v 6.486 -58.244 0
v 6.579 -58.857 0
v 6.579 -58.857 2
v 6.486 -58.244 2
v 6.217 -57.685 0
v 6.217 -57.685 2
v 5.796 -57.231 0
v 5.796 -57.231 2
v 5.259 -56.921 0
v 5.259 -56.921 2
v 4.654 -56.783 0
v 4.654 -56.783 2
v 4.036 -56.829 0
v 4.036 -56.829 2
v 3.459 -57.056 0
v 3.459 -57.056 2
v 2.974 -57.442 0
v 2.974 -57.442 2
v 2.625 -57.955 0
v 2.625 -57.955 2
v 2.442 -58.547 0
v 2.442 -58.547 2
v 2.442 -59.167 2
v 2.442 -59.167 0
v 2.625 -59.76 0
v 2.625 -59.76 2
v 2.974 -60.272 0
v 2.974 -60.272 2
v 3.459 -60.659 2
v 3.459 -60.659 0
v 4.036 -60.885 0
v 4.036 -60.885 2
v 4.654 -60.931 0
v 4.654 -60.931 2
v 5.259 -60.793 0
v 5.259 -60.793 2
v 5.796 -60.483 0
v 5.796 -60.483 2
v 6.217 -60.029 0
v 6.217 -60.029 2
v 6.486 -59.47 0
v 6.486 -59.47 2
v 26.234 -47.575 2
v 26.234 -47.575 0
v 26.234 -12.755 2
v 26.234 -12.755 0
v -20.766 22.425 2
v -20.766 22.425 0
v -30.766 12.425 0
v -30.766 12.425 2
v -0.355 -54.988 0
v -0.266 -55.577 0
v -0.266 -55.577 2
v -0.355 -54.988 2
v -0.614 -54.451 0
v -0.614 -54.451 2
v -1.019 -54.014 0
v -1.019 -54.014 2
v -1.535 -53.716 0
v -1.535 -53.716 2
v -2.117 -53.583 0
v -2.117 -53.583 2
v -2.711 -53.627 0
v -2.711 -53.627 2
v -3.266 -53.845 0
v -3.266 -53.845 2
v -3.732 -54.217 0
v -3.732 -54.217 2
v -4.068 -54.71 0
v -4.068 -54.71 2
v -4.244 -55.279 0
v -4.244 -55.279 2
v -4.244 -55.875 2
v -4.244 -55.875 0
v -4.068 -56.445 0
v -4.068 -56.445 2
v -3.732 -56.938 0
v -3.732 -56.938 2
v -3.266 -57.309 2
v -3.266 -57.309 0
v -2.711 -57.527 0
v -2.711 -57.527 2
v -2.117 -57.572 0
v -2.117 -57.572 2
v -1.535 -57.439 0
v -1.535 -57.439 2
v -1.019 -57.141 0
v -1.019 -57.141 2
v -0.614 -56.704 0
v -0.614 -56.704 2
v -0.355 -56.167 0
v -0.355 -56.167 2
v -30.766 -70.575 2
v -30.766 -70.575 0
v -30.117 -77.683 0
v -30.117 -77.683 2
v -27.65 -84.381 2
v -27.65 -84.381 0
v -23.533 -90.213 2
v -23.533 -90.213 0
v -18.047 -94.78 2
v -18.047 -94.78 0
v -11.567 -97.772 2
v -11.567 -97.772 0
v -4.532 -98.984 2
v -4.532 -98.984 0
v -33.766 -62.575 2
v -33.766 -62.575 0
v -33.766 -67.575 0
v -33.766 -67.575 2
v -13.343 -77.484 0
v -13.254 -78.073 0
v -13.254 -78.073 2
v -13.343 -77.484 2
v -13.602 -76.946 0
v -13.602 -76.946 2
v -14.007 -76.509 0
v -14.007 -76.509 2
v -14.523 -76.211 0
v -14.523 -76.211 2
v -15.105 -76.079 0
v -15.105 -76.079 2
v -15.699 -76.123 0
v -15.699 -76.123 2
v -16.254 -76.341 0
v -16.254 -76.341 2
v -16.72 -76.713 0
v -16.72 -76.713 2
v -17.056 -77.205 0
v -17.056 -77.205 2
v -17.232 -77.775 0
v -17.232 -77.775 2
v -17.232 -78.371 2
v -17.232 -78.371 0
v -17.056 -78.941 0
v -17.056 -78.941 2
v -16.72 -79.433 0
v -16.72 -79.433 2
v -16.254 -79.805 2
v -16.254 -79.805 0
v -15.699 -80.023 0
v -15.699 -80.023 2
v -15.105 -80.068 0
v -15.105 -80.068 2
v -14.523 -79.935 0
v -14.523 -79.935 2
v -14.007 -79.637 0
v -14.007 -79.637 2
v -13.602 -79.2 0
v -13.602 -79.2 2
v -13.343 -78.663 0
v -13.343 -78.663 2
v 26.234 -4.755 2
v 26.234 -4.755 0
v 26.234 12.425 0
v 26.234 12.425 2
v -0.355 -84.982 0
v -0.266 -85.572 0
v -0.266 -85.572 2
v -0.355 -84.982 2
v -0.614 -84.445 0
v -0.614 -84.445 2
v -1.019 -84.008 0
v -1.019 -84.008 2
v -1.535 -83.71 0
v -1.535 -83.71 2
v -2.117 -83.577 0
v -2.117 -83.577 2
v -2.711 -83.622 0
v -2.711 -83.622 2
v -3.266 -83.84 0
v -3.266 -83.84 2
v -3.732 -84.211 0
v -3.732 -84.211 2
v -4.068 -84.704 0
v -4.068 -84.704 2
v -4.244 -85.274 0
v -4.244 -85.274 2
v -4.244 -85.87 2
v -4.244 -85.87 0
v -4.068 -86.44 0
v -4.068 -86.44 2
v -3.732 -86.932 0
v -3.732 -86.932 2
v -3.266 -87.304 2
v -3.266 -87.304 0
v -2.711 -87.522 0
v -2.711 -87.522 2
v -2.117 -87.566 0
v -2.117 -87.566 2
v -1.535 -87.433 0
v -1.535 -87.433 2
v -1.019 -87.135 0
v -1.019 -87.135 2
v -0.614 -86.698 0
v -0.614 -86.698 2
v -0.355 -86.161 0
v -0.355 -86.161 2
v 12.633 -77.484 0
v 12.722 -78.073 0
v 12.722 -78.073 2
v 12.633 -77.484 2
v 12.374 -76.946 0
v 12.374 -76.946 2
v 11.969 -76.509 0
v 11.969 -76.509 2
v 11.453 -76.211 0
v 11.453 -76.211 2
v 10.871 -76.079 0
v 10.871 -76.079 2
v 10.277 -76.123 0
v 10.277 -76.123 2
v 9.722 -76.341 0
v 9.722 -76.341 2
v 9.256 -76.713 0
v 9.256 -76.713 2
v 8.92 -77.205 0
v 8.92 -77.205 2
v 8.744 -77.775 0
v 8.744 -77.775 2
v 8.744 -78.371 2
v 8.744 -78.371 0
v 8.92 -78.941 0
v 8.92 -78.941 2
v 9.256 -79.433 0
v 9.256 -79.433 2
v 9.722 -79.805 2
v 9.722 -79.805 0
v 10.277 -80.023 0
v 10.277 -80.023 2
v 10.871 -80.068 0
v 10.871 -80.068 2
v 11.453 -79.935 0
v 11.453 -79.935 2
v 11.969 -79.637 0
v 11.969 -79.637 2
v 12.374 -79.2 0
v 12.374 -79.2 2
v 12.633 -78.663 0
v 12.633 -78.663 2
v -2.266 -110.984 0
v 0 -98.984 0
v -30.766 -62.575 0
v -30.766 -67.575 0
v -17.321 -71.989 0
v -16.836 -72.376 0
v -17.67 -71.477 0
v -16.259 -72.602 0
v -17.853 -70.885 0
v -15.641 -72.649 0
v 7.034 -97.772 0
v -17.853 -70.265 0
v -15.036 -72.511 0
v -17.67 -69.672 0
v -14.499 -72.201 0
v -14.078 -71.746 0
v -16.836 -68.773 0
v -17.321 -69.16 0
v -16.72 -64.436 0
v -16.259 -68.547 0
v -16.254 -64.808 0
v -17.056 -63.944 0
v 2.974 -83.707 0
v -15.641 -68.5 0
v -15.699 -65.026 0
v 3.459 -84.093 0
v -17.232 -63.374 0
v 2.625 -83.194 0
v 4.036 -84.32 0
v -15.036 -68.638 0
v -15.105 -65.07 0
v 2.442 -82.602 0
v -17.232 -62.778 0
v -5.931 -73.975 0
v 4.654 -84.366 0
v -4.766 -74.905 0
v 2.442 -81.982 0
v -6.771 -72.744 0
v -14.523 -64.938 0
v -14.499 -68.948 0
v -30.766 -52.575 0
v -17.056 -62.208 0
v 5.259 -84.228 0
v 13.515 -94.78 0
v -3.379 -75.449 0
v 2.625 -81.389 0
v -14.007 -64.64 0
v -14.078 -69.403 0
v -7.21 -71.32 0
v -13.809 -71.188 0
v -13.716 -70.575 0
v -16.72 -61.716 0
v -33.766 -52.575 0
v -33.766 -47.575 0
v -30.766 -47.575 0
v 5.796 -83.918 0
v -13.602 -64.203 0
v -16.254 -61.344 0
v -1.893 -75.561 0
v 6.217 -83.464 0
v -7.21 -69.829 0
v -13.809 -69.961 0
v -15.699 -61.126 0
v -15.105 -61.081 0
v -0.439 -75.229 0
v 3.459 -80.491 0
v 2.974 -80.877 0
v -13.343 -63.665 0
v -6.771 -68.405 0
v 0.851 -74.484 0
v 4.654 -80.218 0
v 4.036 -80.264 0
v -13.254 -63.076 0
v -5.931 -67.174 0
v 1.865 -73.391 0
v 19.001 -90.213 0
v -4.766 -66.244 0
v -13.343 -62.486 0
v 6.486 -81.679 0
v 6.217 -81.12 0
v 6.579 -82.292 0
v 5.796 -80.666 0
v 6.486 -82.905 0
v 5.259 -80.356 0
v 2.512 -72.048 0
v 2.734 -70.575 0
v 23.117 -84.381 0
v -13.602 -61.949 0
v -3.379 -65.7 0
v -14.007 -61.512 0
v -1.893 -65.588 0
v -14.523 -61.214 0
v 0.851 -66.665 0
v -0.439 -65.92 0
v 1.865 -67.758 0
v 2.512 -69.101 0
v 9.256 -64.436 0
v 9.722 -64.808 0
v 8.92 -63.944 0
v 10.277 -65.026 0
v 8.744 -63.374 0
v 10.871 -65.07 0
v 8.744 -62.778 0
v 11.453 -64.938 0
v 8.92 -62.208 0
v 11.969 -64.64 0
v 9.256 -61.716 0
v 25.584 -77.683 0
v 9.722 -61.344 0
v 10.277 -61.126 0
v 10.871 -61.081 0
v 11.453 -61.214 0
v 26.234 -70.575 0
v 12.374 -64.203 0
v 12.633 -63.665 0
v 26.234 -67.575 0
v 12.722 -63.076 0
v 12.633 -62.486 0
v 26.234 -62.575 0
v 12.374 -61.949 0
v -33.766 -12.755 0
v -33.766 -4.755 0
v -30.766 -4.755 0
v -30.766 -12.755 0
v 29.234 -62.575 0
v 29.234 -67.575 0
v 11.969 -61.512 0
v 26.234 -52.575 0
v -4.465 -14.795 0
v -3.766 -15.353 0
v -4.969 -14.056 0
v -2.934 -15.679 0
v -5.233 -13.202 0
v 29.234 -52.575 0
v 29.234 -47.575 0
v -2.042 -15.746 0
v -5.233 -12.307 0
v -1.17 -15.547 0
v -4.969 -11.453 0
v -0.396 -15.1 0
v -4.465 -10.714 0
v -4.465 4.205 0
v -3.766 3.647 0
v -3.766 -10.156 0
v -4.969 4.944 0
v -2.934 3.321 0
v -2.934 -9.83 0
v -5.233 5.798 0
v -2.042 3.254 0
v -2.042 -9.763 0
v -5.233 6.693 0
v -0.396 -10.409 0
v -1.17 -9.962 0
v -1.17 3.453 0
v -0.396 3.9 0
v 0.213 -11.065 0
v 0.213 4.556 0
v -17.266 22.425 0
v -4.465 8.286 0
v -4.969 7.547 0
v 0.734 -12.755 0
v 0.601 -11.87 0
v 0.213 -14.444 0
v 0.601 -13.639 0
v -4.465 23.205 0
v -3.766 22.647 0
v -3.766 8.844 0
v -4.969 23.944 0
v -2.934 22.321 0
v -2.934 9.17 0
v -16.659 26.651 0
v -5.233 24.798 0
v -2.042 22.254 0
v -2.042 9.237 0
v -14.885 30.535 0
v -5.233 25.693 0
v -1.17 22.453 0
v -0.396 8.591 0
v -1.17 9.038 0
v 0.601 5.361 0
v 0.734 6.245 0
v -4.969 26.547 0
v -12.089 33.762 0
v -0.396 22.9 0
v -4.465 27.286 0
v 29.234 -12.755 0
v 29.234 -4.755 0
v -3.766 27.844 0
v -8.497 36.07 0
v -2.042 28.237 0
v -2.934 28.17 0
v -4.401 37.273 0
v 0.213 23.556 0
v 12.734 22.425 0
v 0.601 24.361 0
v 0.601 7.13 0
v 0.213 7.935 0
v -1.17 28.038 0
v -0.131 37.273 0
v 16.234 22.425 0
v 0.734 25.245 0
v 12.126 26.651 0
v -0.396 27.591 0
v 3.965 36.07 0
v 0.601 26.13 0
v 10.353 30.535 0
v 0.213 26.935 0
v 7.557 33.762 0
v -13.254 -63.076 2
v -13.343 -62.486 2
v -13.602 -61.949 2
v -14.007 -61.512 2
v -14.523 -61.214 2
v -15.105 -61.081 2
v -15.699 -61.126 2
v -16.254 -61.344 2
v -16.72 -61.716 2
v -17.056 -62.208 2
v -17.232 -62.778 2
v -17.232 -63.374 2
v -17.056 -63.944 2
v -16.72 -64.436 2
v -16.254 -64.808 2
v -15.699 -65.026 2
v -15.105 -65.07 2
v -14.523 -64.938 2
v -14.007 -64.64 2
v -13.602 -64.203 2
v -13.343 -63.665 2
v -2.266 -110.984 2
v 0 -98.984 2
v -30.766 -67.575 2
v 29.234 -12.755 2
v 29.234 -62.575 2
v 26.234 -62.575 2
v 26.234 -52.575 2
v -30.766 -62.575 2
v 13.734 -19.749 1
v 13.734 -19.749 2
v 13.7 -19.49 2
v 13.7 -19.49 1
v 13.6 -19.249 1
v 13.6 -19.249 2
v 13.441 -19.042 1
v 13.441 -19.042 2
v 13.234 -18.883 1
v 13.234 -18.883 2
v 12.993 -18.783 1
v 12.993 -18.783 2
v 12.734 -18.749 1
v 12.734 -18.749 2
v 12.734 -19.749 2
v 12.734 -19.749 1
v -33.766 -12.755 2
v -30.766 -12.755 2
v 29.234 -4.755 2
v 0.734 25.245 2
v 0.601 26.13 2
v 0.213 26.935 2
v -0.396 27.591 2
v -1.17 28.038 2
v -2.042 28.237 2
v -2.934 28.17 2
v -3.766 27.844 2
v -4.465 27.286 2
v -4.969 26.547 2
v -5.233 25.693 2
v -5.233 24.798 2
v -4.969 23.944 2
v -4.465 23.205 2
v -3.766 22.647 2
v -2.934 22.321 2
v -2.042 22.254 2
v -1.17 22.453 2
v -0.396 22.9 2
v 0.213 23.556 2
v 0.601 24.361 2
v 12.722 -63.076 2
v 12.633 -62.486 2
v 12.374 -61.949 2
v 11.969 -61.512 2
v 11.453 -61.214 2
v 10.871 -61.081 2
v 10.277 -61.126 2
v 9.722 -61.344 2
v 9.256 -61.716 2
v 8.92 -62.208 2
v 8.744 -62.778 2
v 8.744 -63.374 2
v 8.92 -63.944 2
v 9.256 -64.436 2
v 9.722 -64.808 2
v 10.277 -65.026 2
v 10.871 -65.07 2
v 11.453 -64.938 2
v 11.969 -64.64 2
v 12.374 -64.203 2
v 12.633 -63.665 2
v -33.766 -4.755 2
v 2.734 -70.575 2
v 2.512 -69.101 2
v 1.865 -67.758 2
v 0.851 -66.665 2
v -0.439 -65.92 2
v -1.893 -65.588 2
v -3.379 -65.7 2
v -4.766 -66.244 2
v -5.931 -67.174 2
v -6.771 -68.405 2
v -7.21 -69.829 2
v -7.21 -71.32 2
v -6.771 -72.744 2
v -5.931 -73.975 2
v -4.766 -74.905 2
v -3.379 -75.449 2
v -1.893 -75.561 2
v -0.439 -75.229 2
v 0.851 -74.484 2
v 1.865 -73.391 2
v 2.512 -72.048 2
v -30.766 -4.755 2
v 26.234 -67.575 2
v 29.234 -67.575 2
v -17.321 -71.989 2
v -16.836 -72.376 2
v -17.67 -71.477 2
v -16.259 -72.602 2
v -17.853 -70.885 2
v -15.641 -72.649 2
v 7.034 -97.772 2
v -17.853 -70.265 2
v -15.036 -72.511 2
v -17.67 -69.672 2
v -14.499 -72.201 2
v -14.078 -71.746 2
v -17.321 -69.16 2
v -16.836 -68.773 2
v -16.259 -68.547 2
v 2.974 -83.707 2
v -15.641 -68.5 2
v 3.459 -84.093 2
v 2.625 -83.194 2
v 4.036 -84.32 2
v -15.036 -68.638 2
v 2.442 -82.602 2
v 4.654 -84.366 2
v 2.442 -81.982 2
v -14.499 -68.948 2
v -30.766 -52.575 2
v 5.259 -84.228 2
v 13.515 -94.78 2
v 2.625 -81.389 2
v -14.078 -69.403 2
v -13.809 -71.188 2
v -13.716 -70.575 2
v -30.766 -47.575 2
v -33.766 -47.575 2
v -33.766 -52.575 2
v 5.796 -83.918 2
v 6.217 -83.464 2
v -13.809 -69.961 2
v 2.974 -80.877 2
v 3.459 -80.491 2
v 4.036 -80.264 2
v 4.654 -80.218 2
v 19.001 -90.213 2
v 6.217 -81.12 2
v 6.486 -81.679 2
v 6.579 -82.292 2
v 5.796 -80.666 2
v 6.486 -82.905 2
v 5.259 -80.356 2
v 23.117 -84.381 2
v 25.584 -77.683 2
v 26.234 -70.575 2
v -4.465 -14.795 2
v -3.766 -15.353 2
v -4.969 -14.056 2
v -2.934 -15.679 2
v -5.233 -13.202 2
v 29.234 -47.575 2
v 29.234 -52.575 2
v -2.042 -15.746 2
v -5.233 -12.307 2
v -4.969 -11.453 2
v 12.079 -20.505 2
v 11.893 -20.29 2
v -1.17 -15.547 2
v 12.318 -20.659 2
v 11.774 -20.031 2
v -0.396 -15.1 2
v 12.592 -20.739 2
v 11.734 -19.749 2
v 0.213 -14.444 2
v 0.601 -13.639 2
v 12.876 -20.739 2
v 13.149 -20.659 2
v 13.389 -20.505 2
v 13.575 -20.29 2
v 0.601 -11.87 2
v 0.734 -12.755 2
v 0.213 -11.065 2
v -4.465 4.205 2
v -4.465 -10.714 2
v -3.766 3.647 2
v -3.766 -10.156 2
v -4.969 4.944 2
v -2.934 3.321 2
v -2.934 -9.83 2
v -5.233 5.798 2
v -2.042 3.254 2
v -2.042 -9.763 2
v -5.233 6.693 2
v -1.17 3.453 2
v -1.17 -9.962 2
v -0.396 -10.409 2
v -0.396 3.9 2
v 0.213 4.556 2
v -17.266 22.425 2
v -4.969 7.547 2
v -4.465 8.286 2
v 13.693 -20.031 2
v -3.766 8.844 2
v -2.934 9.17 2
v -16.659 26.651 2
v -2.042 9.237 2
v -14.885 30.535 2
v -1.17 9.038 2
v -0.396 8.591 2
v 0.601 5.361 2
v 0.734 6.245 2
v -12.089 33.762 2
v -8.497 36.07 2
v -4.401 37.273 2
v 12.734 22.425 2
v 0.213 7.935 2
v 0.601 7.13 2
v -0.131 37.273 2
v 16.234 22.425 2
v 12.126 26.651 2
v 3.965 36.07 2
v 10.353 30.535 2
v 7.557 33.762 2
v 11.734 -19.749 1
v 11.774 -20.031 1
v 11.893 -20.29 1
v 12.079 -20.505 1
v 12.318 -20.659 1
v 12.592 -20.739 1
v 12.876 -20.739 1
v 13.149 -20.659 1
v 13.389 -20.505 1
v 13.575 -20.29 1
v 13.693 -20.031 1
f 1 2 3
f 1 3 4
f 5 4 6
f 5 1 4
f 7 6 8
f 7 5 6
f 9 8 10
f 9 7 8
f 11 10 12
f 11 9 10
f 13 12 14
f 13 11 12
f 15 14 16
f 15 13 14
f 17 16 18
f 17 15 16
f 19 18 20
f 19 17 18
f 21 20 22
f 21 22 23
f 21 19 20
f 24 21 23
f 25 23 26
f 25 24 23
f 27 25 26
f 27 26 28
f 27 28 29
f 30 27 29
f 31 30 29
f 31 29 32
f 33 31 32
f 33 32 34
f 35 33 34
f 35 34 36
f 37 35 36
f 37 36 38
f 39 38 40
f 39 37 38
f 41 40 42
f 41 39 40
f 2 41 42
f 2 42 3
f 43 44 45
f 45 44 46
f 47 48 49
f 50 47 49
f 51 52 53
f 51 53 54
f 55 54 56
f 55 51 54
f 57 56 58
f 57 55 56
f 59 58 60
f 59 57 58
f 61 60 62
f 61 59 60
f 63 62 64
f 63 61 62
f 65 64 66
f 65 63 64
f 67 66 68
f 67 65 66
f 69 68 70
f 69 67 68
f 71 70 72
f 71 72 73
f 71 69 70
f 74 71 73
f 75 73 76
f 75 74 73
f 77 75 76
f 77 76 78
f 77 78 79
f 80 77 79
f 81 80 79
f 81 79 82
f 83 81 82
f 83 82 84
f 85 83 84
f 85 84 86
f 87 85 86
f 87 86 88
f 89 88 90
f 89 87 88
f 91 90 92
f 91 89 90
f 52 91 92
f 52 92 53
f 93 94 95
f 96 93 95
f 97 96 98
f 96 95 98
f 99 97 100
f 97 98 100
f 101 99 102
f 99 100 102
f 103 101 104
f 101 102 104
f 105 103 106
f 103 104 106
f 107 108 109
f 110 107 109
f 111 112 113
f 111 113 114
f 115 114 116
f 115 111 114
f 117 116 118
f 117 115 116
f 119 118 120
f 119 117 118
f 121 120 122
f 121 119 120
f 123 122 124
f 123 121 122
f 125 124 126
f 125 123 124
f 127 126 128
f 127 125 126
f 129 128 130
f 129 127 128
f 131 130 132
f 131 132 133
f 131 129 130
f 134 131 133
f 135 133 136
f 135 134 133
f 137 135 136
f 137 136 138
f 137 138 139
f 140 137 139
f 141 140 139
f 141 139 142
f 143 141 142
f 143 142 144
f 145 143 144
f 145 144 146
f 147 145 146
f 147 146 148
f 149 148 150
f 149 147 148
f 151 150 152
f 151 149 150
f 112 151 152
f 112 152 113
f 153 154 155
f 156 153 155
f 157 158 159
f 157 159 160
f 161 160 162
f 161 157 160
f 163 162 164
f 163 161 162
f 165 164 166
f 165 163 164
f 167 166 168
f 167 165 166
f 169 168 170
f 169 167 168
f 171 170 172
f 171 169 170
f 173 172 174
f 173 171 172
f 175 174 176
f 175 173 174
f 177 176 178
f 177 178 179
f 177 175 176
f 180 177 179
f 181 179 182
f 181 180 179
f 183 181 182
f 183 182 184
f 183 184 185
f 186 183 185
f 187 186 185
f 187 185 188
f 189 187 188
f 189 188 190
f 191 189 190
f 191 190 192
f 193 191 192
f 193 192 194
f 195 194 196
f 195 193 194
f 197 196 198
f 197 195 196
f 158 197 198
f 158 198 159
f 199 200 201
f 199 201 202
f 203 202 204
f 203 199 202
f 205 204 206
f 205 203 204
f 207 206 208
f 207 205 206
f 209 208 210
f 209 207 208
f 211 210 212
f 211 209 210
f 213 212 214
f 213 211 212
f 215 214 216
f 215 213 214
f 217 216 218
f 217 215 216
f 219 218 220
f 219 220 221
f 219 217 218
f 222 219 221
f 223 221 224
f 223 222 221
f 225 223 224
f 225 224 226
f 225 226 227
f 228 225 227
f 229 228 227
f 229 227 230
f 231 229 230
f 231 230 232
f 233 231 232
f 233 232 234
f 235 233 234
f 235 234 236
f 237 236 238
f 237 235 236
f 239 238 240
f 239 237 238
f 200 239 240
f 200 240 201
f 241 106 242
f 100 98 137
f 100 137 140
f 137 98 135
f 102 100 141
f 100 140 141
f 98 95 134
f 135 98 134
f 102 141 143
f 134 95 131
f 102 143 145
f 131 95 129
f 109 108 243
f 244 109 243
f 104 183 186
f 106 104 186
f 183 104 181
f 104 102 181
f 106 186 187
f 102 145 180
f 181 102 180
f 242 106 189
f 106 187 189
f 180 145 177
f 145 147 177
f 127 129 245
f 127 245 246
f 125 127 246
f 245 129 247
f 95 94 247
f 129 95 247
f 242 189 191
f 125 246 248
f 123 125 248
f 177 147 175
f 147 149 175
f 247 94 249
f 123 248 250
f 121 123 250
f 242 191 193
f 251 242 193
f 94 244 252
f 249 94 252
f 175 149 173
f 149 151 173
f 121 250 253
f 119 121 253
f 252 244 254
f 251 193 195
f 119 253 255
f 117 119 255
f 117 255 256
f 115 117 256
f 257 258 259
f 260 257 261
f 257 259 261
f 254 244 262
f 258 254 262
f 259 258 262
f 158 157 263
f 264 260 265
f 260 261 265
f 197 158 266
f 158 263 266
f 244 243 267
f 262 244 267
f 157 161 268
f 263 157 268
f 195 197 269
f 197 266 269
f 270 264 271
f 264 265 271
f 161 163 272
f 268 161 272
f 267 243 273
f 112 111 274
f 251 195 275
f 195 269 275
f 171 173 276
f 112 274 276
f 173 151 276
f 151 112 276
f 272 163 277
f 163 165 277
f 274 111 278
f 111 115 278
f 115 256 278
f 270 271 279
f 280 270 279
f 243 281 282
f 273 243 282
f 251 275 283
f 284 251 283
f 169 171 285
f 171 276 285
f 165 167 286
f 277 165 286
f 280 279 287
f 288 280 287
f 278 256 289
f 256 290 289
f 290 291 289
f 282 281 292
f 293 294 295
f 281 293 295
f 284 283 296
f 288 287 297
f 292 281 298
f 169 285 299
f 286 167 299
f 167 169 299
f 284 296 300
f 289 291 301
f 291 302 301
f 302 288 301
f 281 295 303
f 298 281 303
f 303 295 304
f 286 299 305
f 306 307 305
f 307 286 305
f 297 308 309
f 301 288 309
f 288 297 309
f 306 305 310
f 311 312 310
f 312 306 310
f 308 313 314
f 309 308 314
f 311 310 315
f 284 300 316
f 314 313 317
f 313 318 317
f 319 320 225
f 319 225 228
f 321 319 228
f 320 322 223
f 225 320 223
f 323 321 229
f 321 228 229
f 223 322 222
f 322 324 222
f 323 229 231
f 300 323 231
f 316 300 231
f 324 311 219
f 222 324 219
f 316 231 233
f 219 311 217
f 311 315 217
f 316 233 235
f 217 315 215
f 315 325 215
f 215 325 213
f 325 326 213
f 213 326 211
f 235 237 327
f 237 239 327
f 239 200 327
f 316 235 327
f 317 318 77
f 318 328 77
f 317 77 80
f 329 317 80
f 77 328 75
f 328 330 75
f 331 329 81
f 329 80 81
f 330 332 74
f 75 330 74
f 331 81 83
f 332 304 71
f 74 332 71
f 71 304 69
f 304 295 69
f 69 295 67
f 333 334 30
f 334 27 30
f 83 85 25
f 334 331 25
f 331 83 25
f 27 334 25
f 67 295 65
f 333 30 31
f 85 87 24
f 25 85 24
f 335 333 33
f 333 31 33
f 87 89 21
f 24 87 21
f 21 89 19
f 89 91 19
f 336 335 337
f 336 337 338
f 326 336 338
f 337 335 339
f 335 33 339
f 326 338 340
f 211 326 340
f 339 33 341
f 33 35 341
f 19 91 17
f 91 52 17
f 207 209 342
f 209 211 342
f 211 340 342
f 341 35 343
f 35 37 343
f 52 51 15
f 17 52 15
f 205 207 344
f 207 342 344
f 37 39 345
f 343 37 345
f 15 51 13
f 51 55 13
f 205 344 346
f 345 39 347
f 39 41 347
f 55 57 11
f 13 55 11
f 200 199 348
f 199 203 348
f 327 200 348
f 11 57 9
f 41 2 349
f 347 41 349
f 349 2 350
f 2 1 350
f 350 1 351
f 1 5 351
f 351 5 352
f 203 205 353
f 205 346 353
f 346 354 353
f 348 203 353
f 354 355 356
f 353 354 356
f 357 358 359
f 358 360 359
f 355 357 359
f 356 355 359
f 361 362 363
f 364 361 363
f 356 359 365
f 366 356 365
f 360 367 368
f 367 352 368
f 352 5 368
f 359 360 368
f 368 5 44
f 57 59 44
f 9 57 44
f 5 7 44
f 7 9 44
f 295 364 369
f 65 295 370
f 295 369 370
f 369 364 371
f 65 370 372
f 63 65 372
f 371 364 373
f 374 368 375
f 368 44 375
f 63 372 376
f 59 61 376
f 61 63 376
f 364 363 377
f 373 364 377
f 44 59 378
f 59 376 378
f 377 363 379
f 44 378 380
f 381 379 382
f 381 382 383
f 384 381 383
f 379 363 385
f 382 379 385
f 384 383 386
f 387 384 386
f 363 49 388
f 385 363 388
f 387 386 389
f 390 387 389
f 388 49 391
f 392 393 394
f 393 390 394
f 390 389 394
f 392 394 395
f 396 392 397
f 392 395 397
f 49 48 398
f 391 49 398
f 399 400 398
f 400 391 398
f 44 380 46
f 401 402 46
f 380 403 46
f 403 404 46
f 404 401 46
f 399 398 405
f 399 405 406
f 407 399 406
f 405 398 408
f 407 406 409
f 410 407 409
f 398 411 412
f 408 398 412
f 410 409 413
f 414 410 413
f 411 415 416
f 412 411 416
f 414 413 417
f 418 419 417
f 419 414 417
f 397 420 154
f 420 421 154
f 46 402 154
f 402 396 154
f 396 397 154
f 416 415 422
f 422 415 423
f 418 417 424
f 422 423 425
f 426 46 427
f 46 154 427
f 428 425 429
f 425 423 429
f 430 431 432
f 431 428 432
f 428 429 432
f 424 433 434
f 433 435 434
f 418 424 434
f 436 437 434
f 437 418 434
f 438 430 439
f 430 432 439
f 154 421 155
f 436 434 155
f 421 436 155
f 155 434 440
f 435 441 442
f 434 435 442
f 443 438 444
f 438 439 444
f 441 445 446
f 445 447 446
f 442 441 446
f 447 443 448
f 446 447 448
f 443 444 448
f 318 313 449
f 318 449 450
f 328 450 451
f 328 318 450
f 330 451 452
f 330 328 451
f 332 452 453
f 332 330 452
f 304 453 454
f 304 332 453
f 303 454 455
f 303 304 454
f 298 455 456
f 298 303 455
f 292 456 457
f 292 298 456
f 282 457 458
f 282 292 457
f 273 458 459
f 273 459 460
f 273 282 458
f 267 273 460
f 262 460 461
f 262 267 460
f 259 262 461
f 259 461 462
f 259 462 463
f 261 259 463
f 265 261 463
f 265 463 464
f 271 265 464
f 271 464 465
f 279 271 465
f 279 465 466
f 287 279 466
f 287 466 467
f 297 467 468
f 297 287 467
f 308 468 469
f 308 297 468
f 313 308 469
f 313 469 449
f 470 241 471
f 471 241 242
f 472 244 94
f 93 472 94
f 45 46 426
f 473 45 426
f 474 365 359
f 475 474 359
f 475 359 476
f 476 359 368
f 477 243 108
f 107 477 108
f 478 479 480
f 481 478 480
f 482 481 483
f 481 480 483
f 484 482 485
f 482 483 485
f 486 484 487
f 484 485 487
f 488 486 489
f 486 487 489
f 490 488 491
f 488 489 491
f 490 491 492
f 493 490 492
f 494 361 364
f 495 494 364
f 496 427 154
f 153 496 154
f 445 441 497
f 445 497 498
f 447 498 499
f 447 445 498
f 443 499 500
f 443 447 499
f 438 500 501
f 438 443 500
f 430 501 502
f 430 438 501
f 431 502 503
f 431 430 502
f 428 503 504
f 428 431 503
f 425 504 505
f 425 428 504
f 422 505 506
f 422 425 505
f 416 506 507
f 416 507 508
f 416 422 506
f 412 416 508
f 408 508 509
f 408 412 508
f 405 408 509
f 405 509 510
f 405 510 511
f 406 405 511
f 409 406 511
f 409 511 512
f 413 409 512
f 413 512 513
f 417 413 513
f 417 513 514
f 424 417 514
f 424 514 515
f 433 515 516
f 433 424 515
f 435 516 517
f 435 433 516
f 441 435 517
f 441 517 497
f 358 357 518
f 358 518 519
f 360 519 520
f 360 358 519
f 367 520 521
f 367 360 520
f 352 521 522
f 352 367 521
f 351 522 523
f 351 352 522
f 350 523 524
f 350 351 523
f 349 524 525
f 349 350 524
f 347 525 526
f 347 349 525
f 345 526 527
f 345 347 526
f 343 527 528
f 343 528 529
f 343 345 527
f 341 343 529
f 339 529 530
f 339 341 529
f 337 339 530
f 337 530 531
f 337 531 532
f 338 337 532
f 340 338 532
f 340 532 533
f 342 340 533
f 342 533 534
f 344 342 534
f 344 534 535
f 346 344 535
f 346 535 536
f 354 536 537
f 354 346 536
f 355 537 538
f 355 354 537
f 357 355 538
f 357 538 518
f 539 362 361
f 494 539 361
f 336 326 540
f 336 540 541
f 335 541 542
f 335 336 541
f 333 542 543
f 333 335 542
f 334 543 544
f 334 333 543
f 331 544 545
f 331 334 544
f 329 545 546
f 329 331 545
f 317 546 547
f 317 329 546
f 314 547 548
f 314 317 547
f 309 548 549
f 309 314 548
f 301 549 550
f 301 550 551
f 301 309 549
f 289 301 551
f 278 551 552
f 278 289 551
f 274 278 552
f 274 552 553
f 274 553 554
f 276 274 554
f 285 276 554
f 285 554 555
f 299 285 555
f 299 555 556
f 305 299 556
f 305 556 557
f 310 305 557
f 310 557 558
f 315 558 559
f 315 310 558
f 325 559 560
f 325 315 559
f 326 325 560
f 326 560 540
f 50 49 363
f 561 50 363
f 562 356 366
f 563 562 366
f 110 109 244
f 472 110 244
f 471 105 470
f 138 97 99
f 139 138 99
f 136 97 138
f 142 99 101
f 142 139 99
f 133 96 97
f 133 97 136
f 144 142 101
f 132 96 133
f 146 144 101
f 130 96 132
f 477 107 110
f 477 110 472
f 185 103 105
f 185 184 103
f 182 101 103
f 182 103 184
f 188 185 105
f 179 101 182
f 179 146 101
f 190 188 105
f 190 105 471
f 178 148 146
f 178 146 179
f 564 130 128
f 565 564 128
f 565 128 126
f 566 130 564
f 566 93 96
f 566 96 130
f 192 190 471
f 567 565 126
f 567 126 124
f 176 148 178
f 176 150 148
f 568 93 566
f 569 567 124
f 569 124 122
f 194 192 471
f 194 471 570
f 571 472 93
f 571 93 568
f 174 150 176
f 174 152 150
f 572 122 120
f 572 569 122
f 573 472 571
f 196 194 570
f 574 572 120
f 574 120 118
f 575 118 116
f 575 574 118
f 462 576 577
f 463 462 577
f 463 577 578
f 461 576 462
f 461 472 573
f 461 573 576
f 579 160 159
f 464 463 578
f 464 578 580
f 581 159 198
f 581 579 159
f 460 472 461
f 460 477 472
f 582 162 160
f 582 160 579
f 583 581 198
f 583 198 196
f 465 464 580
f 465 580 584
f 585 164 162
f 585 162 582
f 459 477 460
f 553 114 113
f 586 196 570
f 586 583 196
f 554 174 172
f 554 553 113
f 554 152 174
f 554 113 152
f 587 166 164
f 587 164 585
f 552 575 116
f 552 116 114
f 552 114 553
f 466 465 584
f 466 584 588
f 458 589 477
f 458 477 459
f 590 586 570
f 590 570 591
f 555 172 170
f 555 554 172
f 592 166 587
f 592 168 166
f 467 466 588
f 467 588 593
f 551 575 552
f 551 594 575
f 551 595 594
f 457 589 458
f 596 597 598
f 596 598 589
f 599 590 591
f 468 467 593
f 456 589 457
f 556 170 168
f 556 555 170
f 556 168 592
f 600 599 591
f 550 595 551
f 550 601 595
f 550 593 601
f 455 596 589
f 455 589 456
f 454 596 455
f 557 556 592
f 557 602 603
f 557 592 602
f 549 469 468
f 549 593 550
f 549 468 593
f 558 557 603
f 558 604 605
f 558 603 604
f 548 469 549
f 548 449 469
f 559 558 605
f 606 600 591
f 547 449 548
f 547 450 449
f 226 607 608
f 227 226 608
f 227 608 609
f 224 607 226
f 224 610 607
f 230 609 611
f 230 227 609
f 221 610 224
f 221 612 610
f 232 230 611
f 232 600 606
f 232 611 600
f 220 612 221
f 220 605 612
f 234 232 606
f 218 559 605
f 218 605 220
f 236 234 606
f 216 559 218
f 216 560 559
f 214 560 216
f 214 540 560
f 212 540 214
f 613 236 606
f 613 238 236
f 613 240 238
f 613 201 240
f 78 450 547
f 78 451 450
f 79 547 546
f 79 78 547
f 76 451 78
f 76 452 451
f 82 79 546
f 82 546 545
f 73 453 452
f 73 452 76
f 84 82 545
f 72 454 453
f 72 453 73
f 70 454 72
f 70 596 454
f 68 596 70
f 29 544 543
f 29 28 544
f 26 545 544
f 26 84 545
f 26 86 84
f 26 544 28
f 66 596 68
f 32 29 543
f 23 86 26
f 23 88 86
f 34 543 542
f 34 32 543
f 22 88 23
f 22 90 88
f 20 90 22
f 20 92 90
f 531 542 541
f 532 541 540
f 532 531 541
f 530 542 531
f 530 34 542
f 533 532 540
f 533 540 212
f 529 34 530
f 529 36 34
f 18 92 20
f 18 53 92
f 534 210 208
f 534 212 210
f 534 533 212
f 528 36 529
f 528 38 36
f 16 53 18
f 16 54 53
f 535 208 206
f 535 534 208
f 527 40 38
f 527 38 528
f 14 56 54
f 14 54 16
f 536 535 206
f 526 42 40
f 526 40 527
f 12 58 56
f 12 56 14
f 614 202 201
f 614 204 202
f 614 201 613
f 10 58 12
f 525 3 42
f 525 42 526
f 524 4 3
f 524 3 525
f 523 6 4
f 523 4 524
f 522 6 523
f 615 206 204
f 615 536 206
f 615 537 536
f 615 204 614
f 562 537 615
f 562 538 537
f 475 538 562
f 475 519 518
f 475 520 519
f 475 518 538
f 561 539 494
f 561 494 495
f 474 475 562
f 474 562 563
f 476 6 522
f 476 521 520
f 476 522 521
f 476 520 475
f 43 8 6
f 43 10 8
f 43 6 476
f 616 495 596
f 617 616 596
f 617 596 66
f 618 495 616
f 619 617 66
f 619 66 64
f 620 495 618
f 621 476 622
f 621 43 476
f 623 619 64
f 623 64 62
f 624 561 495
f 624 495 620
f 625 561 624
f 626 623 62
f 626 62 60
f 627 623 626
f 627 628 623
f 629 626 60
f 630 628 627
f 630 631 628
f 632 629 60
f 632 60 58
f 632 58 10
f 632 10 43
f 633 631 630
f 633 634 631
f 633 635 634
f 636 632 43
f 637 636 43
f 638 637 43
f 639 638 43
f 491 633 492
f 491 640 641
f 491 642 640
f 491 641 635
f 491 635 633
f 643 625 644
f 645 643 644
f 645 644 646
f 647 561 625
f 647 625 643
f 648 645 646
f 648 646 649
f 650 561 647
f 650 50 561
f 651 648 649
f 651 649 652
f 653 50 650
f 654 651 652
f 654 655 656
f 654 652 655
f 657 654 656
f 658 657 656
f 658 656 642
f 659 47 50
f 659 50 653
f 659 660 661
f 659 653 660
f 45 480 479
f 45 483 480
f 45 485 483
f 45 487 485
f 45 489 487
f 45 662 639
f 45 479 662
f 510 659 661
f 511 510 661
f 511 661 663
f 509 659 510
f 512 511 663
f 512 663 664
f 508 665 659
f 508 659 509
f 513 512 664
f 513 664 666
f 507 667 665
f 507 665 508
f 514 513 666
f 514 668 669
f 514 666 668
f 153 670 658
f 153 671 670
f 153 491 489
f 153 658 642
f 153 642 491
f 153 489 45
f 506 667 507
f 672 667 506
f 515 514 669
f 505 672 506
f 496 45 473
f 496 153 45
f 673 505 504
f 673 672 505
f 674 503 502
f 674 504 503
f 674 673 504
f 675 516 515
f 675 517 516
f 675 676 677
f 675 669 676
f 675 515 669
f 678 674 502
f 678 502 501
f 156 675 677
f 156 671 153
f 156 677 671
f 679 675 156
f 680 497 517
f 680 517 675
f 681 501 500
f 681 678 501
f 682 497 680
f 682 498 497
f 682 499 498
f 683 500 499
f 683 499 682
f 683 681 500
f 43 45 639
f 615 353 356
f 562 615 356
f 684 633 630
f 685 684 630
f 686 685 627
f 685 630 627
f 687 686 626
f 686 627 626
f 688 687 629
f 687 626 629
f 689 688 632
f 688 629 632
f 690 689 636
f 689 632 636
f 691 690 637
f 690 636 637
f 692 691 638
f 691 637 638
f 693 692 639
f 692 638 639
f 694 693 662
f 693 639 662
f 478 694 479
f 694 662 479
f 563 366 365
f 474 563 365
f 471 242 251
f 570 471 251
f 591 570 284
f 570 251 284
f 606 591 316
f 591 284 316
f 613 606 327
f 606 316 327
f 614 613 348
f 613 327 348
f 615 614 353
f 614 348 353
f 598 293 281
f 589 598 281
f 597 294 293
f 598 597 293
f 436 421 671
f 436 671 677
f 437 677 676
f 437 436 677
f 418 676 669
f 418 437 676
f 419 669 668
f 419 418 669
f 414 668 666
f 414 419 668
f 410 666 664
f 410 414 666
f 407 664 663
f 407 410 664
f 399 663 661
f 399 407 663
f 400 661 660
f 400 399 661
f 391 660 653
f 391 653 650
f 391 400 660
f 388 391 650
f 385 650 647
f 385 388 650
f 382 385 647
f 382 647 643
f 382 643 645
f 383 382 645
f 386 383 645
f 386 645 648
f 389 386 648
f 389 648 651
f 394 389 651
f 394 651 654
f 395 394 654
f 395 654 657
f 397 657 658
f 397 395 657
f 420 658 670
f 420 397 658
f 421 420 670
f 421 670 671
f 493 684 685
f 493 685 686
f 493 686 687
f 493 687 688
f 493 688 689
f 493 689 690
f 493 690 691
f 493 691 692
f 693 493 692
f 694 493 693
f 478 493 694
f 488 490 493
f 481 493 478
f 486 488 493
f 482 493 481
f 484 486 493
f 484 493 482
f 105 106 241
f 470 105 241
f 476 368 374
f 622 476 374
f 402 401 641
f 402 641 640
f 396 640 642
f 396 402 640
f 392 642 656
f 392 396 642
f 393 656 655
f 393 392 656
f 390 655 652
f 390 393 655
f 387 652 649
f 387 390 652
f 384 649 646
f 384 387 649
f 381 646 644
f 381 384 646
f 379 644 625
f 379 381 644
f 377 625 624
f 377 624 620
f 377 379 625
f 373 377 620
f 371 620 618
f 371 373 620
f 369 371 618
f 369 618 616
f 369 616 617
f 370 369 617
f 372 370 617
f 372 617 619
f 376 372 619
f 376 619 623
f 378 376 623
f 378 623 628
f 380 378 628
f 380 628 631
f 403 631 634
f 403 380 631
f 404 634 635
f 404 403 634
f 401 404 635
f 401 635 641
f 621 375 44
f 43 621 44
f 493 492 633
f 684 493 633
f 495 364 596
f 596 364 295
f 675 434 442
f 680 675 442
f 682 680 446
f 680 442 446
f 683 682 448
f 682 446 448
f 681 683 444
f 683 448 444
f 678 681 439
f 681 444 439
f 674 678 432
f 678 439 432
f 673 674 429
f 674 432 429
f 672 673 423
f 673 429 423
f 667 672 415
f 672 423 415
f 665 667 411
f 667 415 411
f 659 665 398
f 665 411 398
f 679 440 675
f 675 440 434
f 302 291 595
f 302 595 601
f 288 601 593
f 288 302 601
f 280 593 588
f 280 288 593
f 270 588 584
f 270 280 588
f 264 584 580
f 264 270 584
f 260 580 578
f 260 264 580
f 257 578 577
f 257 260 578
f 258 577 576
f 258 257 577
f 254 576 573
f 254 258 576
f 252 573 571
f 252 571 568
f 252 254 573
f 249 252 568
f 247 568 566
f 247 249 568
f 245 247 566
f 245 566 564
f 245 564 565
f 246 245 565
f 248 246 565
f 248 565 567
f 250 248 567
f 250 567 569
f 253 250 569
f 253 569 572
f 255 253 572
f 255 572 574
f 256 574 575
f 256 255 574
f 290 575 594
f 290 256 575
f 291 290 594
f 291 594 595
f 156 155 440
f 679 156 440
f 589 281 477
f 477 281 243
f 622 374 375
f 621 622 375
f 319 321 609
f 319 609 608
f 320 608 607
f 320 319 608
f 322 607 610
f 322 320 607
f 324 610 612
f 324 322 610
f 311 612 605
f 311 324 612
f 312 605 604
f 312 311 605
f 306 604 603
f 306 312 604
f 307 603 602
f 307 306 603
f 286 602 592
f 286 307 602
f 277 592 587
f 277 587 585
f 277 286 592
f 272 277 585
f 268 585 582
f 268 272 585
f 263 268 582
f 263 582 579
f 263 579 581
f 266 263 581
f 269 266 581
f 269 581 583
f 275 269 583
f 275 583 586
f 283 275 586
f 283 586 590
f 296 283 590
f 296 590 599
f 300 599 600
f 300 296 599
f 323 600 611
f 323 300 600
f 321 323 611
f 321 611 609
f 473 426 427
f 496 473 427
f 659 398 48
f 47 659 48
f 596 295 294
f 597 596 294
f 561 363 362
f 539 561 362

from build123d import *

# Parameters (mm, degrees)
SKETCH_1_R          = 2
SKETCH_1_R_2        = 2.08
SKETCH_1_R_3        = 5
SKETCH_1_R_4        = 3
EXTRUDE_1_DEPTH     = 2
CUT_EXTRUDE_1_DEPTH = 1


with BuildPart() as part:
    # 草图1 → 凸台-拉伸1 (new body)
    with BuildSketch(Plane.XY):
        with BuildLine():
            Line((26.233844386, -52.574512395), (29.233844386, -52.574512395))
            Line((29.233844386, -52.574512395), (29.233844386, -47.574512395))
            Line((29.233844386, -47.574512395), (26.233844386, -47.574512395))
            Line((26.233844386, -47.574512395), (26.233844386, -12.754512395))
            Line((26.233844386, -12.754512395), (29.233844386, -12.754512395))
            Line((29.233844386, -12.754512395), (29.233844386, -4.754512395))
            Line((29.233844386, -4.754512395), (26.233844386, -4.754512395))
            Line((26.233844386, -4.754512395), (26.233844386, -4.654512395))
            Line((26.233844386, -4.654512395), (26.233844386, 12.425487605))
            Line((26.233844386, 12.425487605), (16.233844386, 22.425487605))
            Line((16.233844386, 22.425487605), (12.733844386, 22.425487605))
            ThreePointArc((12.733844386, 22.425487605), (-2.266155614, 37.425487605), (-17.266155614, 22.425487605))
            Line((-17.266155614, 22.425487605), (-20.766155614, 22.425487605))
            Line((-20.766155614, 22.425487605), (-30.766155614, 12.425487605))
            Line((-30.766155614, 12.425487605), (-30.766155614, -4.654512395))
            Line((-30.766155614, -4.654512395), (-30.766155614, -4.754512395))
            Line((-30.766155614, -4.754512395), (-33.766155614, -4.754512395))
            Line((-33.766155614, -4.754512395), (-33.766155614, -12.754512395))
            Line((-33.766155614, -12.754512395), (-30.766155614, -12.754512395))
            Line((-30.766155614, -12.754512395), (-30.766155614, -47.574512395))
            Line((-30.766155614, -47.574512395), (-33.766155614, -47.574512395))
            Line((-33.766155614, -47.574512395), (-33.766155614, -52.574512395))
            Line((-33.766155614, -52.574512395), (-30.766155614, -52.574512395))
            Line((-30.766155614, -52.574512395), (-30.766155614, -54.574512395))
            Line((-30.766155614, -54.574512395), (-30.766155614, -57.574512395))
            Line((-30.766155614, -57.574512395), (-30.766155614, -62.574512395))
            Line((-30.766155614, -62.574512395), (-33.766155614, -62.574512395))
            Line((-33.766155614, -62.574512395), (-33.766155614, -67.574512395))
            Line((-33.766155614, -67.574512395), (-30.766155614, -67.574512395))
            Line((-30.766155614, -67.574512395), (-30.766155614, -70.574512395))
            ThreePointArc((-30.766155614, -70.574512395), (-23.533087643, -90.212600129), (-4.532311227, -98.984273724))
            Line((-4.532311227, -98.984273724), (-2.266155614, -110.984273724))
            Line((-2.266155614, -110.984273724), (0, -98.984273724))
            ThreePointArc((0, -98.984273724), (19.000776416, -90.212600129), (26.233844386, -70.574512395))
            Line((26.233844386, -70.574512395), (26.233844386, -67.574512395))
            Line((26.233844386, -67.574512395), (29.233844386, -67.574512395))
            Line((29.233844386, -67.574512395), (29.233844386, -62.574512395))
            Line((29.233844386, -62.574512395), (26.233844386, -62.574512395))
            Line((26.233844386, -62.574512395), (26.233844386, -57.574512395))
            Line((26.233844386, -57.574512395), (26.233844386, -54.574512395))
            Line((26.233844386, -54.574512395), (26.233844386, -52.574512395))
        make_face()
        with Locations((-2.266155614, -85.571739483)):
            Circle(SKETCH_1_R, mode=Mode.SUBTRACT)
        with Locations((-15.254135258, -78.073125939)):
            Circle(SKETCH_1_R, mode=Mode.SUBTRACT)
        with Locations((-15.254135258, -63.075898852)):
            Circle(SKETCH_1_R, mode=Mode.SUBTRACT)
        with Locations((-2.266155614, -55.577285308)):
            Circle(SKETCH_1_R, mode=Mode.SUBTRACT)
        with Locations((10.721824031, -63.075898852)):
            Circle(SKETCH_1_R, mode=Mode.SUBTRACT)
        with Locations((10.721824031, -78.073125939)):
            Circle(SKETCH_1_R, mode=Mode.SUBTRACT)
        with Locations((-15.796155614, -70.574512395)):
            Circle(SKETCH_1_R_2, mode=Mode.SUBTRACT)
        with Locations((4.498844386, -58.857188682)):
            Circle(SKETCH_1_R_2, mode=Mode.SUBTRACT)
        with Locations((4.498844386, -82.291836109)):
            Circle(SKETCH_1_R_2, mode=Mode.SUBTRACT)
        with Locations((-2.266155614, -70.574512395)):
            Circle(SKETCH_1_R_3, mode=Mode.SUBTRACT)
        with Locations((-2.266155614, -12.754512395)):
            Circle(SKETCH_1_R_4, mode=Mode.SUBTRACT)
        with Locations((-2.266155614, 6.245487605)):
            Circle(SKETCH_1_R_4, mode=Mode.SUBTRACT)
        with Locations((-2.266155614, 25.245487605)):
            Circle(SKETCH_1_R_4, mode=Mode.SUBTRACT)
    extrude(amount=EXTRUDE_1_DEPTH)

    # 草图2 → 切除-拉伸1 (cut)
    with BuildSketch(Plane.XY.offset(2)):
        with BuildLine():
            Line((12.733844386, -19.749278663), (11.733844386, -19.749278663))
            ThreePointArc((11.733844386, -19.749278663), (12.733844386, -20.749278663), (13.733844386, -19.749278663))
            ThreePointArc((13.733844386, -19.749278663), (13.440951168, -19.042171882), (12.733844386, -18.749278663))
            Line((12.733844386, -18.749278663), (12.733844386, -19.749278663))
        make_face()
    extrude(amount=-CUT_EXTRUDE_1_DEPTH, mode=Mode.SUBTRACT)


solid = part.part
